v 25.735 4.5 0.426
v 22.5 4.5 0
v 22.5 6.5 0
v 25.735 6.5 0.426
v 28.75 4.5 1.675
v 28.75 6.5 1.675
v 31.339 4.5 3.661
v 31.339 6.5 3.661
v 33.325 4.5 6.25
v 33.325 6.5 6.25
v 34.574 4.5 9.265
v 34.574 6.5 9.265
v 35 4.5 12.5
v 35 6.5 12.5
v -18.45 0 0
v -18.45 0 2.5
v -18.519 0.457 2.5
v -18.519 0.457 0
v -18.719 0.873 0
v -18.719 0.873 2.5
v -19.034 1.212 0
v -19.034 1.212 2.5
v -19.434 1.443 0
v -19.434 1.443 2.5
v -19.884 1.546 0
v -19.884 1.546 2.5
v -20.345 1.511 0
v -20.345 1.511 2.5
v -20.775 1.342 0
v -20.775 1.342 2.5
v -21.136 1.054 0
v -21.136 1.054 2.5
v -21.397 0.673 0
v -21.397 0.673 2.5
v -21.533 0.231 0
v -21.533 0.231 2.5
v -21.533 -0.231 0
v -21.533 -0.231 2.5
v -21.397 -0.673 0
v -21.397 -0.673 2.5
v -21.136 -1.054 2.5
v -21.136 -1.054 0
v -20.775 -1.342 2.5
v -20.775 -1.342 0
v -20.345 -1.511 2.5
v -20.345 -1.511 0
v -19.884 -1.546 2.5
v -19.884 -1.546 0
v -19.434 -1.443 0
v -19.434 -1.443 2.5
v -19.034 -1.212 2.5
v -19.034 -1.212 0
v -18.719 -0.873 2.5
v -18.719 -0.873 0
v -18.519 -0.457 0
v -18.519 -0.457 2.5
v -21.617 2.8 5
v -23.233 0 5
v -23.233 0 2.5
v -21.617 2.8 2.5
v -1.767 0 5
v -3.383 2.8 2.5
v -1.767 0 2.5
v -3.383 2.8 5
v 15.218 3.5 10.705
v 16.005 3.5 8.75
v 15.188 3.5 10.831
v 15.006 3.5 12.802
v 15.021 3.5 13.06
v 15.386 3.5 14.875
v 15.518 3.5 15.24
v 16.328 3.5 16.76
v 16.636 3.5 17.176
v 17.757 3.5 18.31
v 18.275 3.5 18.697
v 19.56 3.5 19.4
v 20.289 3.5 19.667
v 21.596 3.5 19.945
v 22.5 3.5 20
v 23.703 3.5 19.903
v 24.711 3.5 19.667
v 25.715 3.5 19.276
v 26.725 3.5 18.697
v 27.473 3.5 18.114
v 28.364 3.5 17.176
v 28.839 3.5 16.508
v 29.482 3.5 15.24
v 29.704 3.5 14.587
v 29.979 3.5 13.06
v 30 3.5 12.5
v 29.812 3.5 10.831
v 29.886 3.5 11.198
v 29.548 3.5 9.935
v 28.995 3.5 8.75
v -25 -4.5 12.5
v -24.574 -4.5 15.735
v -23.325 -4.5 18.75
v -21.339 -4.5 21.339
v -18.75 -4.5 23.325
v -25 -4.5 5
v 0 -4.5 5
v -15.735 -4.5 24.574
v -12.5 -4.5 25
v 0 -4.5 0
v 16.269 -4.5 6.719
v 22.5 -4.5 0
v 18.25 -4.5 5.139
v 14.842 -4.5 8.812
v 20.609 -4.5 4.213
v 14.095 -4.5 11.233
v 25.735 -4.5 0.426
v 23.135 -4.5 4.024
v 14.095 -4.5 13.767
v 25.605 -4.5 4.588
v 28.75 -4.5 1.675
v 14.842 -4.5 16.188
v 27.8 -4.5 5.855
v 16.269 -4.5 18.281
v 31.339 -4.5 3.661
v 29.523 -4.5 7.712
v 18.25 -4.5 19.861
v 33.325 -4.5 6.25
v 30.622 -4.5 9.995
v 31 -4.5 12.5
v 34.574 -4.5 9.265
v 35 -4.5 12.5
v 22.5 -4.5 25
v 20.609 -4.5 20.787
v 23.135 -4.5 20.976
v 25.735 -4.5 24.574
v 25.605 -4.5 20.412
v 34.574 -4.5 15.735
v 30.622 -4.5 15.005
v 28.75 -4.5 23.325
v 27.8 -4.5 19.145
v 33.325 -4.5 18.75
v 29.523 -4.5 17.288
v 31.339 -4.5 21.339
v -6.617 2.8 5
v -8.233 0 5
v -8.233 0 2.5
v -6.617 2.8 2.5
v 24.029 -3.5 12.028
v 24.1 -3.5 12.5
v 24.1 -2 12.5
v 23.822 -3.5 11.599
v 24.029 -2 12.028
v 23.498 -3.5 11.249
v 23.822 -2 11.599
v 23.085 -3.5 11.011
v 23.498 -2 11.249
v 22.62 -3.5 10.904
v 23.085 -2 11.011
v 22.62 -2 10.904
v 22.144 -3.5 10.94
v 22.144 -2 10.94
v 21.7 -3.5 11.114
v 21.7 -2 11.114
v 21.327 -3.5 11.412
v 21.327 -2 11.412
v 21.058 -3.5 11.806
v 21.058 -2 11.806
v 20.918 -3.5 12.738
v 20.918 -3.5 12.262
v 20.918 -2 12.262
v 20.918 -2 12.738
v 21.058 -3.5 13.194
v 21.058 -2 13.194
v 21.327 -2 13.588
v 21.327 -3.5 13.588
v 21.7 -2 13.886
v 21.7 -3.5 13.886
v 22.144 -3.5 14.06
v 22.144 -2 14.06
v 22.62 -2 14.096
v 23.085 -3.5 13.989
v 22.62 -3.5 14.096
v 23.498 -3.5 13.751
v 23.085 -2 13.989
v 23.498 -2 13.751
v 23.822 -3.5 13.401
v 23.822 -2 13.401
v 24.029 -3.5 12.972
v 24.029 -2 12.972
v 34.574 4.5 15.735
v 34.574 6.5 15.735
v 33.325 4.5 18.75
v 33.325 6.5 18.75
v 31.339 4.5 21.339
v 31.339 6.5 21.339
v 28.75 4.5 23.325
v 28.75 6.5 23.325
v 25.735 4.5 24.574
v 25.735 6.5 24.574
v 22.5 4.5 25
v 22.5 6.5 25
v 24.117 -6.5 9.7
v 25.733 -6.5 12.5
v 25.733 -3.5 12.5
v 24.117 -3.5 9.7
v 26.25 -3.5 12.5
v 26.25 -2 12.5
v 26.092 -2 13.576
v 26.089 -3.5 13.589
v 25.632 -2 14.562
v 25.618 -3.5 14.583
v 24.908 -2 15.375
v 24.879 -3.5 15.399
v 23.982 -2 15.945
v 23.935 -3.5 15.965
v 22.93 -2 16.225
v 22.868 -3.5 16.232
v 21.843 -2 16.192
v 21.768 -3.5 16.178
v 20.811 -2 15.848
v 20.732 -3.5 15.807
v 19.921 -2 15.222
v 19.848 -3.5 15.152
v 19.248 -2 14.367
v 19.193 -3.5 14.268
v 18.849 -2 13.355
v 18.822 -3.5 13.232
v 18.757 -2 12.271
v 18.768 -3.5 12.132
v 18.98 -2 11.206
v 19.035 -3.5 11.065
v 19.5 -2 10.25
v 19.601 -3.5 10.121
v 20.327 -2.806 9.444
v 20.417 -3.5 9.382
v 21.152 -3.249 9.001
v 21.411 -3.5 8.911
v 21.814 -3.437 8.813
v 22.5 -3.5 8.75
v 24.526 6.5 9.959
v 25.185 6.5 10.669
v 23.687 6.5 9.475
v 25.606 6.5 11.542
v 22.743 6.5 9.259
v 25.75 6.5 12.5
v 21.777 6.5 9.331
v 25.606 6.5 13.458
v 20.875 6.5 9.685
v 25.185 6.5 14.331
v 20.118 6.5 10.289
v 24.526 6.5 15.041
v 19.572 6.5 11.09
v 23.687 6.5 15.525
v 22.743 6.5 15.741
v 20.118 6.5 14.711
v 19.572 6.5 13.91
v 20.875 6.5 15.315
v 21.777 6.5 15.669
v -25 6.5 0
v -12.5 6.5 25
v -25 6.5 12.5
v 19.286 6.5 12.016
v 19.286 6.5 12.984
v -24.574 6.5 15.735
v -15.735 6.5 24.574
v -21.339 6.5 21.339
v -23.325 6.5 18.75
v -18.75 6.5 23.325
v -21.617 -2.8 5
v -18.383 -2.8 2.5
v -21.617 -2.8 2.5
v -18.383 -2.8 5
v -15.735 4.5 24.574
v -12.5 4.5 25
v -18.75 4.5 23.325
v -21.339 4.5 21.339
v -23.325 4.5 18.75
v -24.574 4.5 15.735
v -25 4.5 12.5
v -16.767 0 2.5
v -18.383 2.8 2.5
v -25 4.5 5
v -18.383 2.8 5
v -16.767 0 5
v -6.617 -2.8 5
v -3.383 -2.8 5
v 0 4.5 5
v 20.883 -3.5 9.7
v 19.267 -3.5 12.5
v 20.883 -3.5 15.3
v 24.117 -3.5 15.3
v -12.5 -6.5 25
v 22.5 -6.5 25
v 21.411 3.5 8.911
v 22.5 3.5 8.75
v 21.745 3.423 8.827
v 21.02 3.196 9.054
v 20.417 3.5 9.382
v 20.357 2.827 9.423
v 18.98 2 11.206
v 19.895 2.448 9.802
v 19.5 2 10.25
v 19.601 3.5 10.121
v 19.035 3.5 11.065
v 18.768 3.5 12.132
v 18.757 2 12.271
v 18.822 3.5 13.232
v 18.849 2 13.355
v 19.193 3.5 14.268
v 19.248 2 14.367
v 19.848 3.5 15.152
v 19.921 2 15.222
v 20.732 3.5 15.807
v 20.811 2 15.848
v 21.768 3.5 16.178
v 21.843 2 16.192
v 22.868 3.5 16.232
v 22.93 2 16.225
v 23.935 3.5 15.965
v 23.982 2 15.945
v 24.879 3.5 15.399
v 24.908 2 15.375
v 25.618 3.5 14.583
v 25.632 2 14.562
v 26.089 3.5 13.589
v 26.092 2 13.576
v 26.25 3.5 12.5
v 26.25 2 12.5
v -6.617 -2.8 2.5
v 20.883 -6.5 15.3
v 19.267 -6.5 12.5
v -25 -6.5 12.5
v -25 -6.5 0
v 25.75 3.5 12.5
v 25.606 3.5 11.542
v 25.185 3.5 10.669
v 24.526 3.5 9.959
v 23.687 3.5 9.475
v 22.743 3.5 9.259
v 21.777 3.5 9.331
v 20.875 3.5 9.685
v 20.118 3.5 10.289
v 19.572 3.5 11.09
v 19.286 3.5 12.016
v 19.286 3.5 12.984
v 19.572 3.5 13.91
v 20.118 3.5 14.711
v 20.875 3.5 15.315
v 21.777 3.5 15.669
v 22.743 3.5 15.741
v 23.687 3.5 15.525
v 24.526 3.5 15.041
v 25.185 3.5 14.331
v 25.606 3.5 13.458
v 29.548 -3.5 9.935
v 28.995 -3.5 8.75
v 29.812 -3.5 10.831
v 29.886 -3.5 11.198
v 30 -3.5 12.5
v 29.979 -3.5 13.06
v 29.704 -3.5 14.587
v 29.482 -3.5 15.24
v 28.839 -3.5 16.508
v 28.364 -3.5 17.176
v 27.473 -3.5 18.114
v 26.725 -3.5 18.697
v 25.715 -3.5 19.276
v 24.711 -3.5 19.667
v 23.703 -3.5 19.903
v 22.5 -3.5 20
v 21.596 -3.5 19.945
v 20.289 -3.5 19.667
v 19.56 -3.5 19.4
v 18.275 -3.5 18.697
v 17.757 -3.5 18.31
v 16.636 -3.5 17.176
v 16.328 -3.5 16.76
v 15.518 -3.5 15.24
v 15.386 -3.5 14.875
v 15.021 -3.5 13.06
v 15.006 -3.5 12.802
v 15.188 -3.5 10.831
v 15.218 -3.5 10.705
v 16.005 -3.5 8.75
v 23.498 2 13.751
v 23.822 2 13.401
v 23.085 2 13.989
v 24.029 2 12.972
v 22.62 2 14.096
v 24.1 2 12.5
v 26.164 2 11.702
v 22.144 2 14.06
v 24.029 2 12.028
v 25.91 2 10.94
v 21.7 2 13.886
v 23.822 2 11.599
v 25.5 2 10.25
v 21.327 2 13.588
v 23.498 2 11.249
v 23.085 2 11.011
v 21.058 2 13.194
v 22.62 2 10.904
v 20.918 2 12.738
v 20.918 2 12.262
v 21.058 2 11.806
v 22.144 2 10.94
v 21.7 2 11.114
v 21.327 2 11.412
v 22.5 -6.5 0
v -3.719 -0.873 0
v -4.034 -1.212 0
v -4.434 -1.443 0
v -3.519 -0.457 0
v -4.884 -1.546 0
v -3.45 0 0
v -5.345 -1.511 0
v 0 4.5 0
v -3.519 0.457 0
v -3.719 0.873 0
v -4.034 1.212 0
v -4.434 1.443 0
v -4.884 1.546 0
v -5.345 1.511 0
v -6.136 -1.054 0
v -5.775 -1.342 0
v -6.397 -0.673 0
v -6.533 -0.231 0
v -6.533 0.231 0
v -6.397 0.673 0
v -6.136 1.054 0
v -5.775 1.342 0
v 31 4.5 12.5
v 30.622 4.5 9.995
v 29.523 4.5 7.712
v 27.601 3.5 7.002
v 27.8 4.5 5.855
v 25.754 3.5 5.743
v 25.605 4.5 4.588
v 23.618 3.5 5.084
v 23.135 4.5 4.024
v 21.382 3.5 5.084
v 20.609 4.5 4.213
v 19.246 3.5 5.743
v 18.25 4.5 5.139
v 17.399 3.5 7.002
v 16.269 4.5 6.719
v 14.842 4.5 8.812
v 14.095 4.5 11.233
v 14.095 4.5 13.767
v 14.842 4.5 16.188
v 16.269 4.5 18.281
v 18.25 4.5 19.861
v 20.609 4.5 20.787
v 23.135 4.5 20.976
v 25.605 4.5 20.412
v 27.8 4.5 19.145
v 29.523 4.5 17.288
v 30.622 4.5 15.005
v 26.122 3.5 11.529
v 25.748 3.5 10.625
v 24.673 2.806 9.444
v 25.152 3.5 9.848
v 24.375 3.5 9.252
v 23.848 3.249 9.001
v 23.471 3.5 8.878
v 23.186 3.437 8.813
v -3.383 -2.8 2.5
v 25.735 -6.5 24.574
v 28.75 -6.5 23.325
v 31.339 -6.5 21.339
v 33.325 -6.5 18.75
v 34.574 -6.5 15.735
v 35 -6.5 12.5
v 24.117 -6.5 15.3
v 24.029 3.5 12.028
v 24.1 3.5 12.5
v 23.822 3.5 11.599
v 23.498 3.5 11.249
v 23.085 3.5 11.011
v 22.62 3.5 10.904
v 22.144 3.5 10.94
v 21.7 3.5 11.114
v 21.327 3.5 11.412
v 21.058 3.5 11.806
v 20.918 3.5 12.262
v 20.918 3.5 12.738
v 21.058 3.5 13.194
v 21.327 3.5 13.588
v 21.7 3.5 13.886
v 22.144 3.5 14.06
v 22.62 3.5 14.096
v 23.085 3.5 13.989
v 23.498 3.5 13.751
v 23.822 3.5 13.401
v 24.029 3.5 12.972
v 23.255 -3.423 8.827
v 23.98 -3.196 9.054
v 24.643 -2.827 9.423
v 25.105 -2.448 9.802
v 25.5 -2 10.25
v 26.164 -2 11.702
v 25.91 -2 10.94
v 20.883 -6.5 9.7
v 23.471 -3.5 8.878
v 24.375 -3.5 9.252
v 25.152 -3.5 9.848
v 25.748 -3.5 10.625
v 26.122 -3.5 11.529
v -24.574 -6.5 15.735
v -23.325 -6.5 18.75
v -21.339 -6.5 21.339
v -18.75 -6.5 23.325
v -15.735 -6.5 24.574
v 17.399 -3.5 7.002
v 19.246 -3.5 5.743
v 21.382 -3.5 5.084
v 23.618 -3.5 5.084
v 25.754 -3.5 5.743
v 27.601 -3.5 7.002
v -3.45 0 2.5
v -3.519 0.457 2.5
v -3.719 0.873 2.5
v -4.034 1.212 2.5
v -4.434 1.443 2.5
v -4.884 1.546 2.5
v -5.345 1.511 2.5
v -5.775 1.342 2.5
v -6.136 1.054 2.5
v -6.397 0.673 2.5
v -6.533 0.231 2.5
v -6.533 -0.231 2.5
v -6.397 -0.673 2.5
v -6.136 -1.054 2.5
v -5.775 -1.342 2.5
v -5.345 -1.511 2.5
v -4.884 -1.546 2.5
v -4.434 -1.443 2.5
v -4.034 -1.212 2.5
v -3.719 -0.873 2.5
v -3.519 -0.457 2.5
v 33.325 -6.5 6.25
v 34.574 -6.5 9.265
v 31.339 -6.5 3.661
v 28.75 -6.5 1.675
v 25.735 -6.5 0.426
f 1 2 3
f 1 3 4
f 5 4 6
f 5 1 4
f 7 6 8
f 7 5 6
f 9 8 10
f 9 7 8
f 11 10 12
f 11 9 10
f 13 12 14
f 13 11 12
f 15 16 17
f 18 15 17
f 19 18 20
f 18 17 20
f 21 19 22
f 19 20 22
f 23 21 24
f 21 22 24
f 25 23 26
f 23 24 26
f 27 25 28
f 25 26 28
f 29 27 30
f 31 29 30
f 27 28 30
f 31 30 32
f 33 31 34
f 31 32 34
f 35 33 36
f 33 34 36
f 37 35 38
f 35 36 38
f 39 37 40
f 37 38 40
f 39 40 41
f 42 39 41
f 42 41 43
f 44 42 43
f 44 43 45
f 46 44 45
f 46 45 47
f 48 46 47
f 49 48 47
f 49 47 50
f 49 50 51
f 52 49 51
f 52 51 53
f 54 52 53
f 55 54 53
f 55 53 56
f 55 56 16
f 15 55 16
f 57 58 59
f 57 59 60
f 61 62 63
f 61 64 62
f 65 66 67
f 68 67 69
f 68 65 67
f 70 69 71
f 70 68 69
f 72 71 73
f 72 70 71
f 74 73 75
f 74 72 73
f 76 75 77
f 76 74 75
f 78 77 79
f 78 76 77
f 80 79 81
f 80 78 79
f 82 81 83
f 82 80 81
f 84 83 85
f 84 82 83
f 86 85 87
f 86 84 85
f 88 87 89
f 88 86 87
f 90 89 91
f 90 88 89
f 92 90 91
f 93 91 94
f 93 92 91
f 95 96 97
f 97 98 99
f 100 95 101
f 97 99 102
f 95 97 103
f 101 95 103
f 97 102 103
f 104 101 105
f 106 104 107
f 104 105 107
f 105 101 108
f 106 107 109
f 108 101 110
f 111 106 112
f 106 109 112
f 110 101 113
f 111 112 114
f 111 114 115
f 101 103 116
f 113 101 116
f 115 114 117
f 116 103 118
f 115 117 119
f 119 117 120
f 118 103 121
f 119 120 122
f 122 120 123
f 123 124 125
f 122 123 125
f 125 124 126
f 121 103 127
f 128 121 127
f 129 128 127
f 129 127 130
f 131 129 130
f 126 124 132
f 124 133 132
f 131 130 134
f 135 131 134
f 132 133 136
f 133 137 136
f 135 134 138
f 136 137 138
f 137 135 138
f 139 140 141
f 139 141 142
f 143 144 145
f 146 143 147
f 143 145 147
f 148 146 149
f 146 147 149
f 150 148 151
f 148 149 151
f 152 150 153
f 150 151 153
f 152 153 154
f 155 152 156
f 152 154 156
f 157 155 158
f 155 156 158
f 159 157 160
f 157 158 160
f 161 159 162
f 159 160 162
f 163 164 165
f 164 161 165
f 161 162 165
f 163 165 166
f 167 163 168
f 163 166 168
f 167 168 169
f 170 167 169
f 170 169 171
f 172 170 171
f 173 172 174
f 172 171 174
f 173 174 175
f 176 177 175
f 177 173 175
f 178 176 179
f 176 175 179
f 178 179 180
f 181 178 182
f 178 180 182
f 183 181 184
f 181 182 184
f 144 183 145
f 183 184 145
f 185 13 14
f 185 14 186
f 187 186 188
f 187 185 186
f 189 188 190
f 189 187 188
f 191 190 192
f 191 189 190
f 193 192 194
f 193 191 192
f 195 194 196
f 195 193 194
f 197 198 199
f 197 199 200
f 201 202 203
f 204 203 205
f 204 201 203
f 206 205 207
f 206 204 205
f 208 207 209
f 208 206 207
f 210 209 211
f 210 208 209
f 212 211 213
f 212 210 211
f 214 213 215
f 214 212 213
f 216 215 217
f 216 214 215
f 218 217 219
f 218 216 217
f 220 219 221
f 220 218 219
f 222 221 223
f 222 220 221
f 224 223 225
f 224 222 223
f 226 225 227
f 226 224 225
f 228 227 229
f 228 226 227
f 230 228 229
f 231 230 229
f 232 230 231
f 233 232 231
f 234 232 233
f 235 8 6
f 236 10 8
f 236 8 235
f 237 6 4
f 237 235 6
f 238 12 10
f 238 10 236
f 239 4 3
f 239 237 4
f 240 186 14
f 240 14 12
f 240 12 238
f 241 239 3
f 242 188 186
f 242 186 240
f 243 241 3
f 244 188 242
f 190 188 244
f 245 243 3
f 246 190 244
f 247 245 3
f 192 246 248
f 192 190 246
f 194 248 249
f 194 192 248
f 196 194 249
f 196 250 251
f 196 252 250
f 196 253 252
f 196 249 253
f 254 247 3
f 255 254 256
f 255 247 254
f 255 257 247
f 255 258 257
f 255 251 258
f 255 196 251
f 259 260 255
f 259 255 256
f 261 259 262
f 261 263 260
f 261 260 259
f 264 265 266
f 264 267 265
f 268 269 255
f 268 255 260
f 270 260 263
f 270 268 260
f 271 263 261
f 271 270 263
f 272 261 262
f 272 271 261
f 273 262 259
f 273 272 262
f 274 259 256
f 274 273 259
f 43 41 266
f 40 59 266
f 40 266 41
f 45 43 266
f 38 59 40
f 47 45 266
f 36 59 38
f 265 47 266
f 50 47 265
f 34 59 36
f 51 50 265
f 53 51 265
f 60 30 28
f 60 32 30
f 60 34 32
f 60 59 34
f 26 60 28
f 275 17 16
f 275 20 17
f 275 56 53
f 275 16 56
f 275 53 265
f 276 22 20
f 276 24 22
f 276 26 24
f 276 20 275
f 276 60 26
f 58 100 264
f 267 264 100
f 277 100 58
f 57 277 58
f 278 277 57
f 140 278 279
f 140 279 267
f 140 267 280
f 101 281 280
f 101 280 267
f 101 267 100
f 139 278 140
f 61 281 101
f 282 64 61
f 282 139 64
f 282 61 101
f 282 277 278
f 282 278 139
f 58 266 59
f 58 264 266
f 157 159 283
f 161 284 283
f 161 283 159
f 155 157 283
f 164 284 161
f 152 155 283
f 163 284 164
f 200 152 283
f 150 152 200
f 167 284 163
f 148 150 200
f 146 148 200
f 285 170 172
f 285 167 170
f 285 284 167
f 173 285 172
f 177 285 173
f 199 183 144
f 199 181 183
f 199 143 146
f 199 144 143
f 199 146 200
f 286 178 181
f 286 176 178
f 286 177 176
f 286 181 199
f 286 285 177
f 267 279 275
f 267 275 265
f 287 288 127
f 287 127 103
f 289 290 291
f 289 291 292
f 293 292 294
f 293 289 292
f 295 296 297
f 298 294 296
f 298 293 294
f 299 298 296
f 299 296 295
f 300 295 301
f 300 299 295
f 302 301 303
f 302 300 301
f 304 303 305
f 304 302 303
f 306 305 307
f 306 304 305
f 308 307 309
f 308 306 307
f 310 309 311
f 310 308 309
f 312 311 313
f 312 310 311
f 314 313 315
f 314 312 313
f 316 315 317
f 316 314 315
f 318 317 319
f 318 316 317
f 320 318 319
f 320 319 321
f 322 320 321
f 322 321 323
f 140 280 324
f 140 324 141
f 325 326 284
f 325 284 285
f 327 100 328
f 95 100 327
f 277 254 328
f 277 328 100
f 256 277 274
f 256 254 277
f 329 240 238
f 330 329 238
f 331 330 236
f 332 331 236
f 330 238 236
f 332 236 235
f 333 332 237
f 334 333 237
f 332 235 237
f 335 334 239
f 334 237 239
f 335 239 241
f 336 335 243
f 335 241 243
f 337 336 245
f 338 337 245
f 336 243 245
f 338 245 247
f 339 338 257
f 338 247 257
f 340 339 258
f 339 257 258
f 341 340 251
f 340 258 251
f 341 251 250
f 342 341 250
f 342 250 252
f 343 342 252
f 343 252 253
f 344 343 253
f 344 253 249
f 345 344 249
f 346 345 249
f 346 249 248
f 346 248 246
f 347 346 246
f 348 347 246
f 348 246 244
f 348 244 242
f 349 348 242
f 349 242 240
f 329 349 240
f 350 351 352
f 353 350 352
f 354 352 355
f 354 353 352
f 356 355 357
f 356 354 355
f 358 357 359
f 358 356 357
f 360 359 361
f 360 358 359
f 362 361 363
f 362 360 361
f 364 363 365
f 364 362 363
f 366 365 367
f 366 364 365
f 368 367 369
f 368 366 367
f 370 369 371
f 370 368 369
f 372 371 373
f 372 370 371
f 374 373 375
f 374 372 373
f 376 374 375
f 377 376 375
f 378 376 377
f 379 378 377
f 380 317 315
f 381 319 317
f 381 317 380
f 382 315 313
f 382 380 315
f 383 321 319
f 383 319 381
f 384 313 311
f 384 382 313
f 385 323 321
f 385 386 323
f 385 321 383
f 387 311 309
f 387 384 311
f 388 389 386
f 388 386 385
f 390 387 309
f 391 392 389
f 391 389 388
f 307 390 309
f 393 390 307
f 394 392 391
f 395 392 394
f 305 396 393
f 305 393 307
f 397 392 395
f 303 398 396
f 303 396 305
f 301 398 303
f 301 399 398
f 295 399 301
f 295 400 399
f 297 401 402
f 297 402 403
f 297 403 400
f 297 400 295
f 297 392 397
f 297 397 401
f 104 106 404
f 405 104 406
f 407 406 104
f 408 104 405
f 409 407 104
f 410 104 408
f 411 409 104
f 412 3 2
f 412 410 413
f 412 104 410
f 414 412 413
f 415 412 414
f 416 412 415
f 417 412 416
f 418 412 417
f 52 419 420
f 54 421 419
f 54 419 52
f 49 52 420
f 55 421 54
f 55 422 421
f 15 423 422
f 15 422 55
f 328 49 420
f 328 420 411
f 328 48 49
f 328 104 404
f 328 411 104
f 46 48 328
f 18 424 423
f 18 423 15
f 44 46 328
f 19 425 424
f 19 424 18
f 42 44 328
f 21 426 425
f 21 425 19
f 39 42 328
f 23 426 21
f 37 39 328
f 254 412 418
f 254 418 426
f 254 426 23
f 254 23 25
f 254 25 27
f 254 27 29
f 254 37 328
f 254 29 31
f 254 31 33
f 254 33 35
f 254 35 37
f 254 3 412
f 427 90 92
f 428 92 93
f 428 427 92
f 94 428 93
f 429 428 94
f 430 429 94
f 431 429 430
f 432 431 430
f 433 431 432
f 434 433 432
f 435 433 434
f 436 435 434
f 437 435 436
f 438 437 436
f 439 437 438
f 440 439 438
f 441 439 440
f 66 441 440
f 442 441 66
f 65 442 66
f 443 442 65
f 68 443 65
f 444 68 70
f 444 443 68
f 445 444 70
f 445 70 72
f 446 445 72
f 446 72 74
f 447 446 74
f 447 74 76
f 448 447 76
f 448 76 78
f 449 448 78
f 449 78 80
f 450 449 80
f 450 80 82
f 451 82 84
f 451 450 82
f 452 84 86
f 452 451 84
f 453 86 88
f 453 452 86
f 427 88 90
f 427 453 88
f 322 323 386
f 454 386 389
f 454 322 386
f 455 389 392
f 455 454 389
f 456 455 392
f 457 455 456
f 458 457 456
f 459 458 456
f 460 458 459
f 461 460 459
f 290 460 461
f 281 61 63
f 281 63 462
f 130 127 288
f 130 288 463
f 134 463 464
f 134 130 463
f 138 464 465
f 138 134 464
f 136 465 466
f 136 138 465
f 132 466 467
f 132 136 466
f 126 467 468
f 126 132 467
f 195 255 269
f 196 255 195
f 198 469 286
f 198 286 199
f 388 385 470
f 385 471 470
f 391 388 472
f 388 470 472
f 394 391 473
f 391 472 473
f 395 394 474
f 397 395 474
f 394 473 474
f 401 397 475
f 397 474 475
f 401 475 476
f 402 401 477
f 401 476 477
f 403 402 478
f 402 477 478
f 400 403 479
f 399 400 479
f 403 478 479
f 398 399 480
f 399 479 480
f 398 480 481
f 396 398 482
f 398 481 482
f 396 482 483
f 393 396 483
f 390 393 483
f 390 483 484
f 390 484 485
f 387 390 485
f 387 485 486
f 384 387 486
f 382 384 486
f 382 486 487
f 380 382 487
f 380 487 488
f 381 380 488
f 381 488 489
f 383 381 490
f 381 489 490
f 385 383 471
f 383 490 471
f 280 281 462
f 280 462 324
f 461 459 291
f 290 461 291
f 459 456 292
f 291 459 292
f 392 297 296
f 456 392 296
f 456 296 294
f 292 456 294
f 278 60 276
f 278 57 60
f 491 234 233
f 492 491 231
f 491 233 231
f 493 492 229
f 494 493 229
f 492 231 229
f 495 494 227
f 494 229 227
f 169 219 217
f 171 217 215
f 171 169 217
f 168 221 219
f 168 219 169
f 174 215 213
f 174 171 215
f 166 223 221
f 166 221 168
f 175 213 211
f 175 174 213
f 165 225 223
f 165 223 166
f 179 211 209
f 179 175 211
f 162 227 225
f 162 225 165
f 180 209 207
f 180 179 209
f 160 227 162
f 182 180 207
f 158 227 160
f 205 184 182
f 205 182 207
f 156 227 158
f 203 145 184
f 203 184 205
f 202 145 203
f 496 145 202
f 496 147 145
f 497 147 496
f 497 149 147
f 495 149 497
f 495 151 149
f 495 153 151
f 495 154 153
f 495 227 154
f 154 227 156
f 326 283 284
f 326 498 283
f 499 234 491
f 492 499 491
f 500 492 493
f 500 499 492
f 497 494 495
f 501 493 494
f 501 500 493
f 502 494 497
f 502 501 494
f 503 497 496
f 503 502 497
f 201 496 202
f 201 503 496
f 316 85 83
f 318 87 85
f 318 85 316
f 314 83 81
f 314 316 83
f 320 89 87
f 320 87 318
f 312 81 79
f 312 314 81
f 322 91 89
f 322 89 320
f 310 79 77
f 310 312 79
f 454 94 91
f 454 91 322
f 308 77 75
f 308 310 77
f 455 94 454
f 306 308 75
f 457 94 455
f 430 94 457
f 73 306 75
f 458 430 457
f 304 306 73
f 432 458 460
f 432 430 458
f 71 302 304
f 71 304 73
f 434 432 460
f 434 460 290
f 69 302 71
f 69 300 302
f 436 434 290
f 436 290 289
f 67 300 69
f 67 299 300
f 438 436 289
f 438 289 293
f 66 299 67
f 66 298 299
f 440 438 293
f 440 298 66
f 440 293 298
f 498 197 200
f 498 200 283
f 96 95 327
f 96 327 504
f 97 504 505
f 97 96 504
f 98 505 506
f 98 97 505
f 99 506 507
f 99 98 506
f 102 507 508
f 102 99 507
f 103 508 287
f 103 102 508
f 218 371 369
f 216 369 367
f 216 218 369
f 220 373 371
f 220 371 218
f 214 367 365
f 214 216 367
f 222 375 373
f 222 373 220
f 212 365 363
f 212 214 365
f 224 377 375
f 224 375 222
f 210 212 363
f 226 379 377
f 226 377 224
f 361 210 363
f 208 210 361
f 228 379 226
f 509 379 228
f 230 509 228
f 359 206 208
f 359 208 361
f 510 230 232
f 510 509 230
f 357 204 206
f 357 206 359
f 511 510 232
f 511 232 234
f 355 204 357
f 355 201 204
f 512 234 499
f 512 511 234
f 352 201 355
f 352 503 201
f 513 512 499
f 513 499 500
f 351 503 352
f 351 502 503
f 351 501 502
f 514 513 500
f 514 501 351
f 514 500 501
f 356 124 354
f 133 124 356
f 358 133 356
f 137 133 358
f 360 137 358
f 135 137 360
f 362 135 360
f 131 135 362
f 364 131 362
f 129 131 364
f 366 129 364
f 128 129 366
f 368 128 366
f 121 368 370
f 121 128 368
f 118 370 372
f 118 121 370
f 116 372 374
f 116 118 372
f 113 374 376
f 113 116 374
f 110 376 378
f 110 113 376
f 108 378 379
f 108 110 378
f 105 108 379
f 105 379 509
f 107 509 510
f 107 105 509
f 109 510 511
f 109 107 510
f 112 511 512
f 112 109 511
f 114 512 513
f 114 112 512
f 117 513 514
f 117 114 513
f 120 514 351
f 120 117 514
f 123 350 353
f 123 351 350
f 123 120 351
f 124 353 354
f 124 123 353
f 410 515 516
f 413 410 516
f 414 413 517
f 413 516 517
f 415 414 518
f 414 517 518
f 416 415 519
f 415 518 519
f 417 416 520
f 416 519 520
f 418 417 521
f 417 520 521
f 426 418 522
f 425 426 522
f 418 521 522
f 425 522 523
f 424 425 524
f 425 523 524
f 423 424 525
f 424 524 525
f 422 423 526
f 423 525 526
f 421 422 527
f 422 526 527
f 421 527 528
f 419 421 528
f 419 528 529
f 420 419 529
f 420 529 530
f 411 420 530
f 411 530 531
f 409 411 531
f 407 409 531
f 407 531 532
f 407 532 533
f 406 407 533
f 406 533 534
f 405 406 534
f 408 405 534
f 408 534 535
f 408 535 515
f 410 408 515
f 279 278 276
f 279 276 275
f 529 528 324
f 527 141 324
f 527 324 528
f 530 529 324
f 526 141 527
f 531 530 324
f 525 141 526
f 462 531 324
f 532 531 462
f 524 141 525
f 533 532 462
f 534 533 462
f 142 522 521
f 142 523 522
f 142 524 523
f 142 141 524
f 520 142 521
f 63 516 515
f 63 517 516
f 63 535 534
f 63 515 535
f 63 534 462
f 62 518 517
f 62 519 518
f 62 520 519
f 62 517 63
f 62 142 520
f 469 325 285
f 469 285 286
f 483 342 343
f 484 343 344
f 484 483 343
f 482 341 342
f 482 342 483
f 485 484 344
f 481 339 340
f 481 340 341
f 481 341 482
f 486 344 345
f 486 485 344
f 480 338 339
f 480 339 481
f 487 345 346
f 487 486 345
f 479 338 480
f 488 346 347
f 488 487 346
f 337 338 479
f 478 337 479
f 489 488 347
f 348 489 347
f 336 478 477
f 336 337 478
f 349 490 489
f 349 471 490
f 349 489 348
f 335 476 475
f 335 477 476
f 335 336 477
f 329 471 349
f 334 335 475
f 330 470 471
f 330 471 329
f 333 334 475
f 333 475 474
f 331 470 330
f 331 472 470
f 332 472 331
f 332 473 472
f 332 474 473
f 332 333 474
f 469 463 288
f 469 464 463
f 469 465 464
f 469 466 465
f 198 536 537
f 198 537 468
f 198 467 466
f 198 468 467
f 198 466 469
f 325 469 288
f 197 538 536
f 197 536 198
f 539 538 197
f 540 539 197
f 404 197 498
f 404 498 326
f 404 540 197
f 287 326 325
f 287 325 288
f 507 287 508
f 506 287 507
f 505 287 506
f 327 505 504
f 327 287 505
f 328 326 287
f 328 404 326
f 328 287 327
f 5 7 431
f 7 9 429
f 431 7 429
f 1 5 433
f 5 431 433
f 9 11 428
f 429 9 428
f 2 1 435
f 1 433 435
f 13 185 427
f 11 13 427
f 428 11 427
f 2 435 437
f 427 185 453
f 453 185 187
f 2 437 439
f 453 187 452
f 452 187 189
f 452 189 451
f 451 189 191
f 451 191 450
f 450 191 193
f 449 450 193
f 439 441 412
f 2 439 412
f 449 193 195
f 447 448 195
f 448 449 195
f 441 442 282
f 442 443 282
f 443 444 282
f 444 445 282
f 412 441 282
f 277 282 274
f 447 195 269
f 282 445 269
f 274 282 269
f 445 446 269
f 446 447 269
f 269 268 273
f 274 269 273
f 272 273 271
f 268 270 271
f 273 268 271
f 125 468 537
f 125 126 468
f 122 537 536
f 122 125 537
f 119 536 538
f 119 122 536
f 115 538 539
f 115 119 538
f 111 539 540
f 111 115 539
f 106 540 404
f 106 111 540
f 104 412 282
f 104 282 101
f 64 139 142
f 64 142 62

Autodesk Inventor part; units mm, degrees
ref_plane "YZ Plane" through (0, 0, 0) normal (1, 0, 0) x (0, 1, 0)
ref_plane "XZ Plane" through (0, 0, 0) normal (0, 1, 0) x (-1, 0, 0)
ref_plane "XY Plane" through (0, 0, 0) normal (0, 0, 1) x (1, 0, 0)
sketch "Sketch1" plane through (0, 0, 0) normal (0, 0, 1) x (1, 0, 0)
  line L0 (-25, 6.5) -> (0, 6.5)
  line L1 (0, 6.5) -> (0, -6.5)
  line L2 (0, -6.5) -> (-25, -6.5)
  line L3 (-25, -6.5) -> (-25, 6.5)
  point P0 (0, 0)
  point P1 (0, 0)
  dimension "d0" = 13
  dimension "d2" = 25
extrude "Extrusion1" add sketch "Sketch1" along normal blind 5
sketch "Sketch2" plane through (-25, -6.5, 0) normal (0, -1, 0) x (1, 0, 0)
  line L0 (25, 0) -> (25, 5) projected
  line L1 (0, 0) -> (60, 0)
  line L2 (60, 0) -> (60, 25)
  line L3 (60, 25) -> (0, 25)
  line L4 (0, 25) -> (0, 0)
  dimension "d5" = 35
  dimension "d6" = 25
extrude "Extrusion2" add sketch "Sketch2" against normal blind 2
fillet "Fillet1" radius 12.5 3 edges at (35, -5.5, 0) (35, -5.5, 25) (-25, -5.5, 25)
sketch "Sketch4" plane through (-25, -4.5, 0) normal (0, 1, 0) x (1, 0, 0)
  arc A0 (47.5, -25) -> (47.5, 0) centre (47.5, -12.5) ccw projected
  circle A1 centre (47.5, -12.5) radius 7.5
  dimension "d10" = 15
extrude "Extrusion3" add sketch "Sketch4" along normal blind 1
chamfer "Chamfer1" distance 1 angle 45 1 edges at (15, -4.5, 12.5)
sketch "Sketch5" plane through (22.5, -3.5, 12.5) normal (0, 1, 0) x (1, 0, 0)
  circle A0 centre (0, 0) radius 7.5 projected
  circle A1 centre (0, 0) radius 3.75
  point P0 (-22.5, 12.5)
  dimension "d17" = 7.5
extrude "Extrusion4" add sketch "Sketch5" along normal blind 1.5 contours A1
sketch "Sketch6" plane through (0, 6.5, 5) normal (1, 0, 0) x (0, 0, -1)
  line L0 (-3.75, -8.5) -> (-11.25, -8.5) projected
  line L1 (-11.25, -10) -> (-3.75, -10) projected
  line L2 (-3.75, -10) -> (-5.25, -8.5)
  line L3 (-3.75, -8.5) -> (-3.75, -10)
  line L4 (-3.75, -8.5) -> (-5.25, -8.5)
  point P0 (5, -6.5)
extrude "Extrusion5" cut sketch "Sketch6" along normal through all
mirror "Mirror1" about plane through (0, 0, 0) normal (0, 1, 0) of "Extrusion4", "Extrusion3", "Chamfer1", "Fillet1", "Extrusion2", "Extrusion5"
sketch "Sketch7" plane through (0, 0, 5) normal (0, 0, 1) x (1, 0, 0)
  line L0 (-25, 4.5) -> (-25, -4.5) projected
  line L1 (0, -4.5) -> (0, 4.5) projected
  line L2 (-25, 0) -> (0, 0)
  circle A0 centre (-20, 0) radius 1.55
  circle A1 centre (-5, 0) radius 1.55
  dimension "d23" = 5
  dimension "d24" = 5
  dimension "d25" = 3.1
extrude "Extrusion6" cut sketch "Sketch7" against normal through all
sketch "Sketch8" plane through (0, 0, 5) normal (0, 0, 1) x (1, 0, 0)
  circle A0 centre (-5, 0) radius 1.55 projected
  circle A1 centre (-20, 0) radius 1.55 projected
  line L0 (-16.7668, 0) -> (-18.3834, -2.8)
  line L1 (-18.3834, -2.8) -> (-21.6166, -2.8)
  line L2 (-21.6166, -2.8) -> (-23.2332, 0)
  line L3 (-23.2332, 0) -> (-21.6166, 2.8)
  line L4 (-21.6166, 2.8) -> (-18.3834, 2.8)
  line L5 (-18.3834, 2.8) -> (-16.7668, 0)
  line L6 (-8.2332, 0) -> (-6.6166, 2.8)
  line L7 (-6.6166, 2.8) -> (-3.3834, 2.8)
  line L8 (-3.3834, 2.8) -> (-1.7668, 0)
  line L9 (-1.7668, 0) -> (-3.3834, -2.8)
  line L10 (-3.3834, -2.8) -> (-6.6166, -2.8)
  line L11 (-6.6166, -2.8) -> (-8.2332, 0)
  point P0 (0, 0)
  dimension "d28" = 5.6
extrude "Extrusion7" cut sketch "Sketch8" against normal blind 2.5
sketch "Sketch9" plane through (-12.5, 6.5, 25) normal (0, 1, 0) x (1, 0, 0)
  arc A0 (35, 0) -> (35, 25) centre (35, 12.5) ccw projected
  circle A1 centre (35, 12.5) radius 1.6
  point P0 (12.5, 25)
  dimension "d32" = 3.2
extrude "Extrusion8" cut sketch "Sketch9" against normal through all
sketch "Sketch10" plane through (-12.5, 6.5, 25) normal (0, 1, 0) x (1, 0, 0)
  circle A0 centre (35, 12.5) radius 1.6 projected
  arc A1 (35, 0) -> (35, 25) centre (35, 12.5) ccw projected
  circle A2 centre (35, 12.5) radius 3.25
  point P0 (12.5, 25)
  dimension "d36" = 6.5
extrude "Extrusion9" cut sketch "Sketch10" against normal blind 3
sketch "Sketch11" plane through (-12.5, -6.5, 25) normal (0, -1, 0) x (1, 0, 0)
  circle A0 centre (35, -12.5) radius 1.6 projected
  arc A1 (35, -25) -> (35, 0) centre (35, -12.5) ccw projected
  line L0 (31.7668, -12.5) -> (33.3834, -9.7)
  line L1 (33.3834, -9.7) -> (36.6166, -9.7)
  line L2 (36.6166, -9.7) -> (38.2332, -12.5)
  line L3 (38.2332, -12.5) -> (36.6166, -15.3)
  line L4 (36.6166, -15.3) -> (33.3834, -15.3)
  line L5 (33.3834, -15.3) -> (31.7668, -12.5)
  point P0 (12.5, -25)
  point P1 (35, -9.7)
  dimension "d40" = 5.6
extrude "Extrusion10" cut sketch "Sketch11" against normal blind 3
properties part number "z pulley holder"
